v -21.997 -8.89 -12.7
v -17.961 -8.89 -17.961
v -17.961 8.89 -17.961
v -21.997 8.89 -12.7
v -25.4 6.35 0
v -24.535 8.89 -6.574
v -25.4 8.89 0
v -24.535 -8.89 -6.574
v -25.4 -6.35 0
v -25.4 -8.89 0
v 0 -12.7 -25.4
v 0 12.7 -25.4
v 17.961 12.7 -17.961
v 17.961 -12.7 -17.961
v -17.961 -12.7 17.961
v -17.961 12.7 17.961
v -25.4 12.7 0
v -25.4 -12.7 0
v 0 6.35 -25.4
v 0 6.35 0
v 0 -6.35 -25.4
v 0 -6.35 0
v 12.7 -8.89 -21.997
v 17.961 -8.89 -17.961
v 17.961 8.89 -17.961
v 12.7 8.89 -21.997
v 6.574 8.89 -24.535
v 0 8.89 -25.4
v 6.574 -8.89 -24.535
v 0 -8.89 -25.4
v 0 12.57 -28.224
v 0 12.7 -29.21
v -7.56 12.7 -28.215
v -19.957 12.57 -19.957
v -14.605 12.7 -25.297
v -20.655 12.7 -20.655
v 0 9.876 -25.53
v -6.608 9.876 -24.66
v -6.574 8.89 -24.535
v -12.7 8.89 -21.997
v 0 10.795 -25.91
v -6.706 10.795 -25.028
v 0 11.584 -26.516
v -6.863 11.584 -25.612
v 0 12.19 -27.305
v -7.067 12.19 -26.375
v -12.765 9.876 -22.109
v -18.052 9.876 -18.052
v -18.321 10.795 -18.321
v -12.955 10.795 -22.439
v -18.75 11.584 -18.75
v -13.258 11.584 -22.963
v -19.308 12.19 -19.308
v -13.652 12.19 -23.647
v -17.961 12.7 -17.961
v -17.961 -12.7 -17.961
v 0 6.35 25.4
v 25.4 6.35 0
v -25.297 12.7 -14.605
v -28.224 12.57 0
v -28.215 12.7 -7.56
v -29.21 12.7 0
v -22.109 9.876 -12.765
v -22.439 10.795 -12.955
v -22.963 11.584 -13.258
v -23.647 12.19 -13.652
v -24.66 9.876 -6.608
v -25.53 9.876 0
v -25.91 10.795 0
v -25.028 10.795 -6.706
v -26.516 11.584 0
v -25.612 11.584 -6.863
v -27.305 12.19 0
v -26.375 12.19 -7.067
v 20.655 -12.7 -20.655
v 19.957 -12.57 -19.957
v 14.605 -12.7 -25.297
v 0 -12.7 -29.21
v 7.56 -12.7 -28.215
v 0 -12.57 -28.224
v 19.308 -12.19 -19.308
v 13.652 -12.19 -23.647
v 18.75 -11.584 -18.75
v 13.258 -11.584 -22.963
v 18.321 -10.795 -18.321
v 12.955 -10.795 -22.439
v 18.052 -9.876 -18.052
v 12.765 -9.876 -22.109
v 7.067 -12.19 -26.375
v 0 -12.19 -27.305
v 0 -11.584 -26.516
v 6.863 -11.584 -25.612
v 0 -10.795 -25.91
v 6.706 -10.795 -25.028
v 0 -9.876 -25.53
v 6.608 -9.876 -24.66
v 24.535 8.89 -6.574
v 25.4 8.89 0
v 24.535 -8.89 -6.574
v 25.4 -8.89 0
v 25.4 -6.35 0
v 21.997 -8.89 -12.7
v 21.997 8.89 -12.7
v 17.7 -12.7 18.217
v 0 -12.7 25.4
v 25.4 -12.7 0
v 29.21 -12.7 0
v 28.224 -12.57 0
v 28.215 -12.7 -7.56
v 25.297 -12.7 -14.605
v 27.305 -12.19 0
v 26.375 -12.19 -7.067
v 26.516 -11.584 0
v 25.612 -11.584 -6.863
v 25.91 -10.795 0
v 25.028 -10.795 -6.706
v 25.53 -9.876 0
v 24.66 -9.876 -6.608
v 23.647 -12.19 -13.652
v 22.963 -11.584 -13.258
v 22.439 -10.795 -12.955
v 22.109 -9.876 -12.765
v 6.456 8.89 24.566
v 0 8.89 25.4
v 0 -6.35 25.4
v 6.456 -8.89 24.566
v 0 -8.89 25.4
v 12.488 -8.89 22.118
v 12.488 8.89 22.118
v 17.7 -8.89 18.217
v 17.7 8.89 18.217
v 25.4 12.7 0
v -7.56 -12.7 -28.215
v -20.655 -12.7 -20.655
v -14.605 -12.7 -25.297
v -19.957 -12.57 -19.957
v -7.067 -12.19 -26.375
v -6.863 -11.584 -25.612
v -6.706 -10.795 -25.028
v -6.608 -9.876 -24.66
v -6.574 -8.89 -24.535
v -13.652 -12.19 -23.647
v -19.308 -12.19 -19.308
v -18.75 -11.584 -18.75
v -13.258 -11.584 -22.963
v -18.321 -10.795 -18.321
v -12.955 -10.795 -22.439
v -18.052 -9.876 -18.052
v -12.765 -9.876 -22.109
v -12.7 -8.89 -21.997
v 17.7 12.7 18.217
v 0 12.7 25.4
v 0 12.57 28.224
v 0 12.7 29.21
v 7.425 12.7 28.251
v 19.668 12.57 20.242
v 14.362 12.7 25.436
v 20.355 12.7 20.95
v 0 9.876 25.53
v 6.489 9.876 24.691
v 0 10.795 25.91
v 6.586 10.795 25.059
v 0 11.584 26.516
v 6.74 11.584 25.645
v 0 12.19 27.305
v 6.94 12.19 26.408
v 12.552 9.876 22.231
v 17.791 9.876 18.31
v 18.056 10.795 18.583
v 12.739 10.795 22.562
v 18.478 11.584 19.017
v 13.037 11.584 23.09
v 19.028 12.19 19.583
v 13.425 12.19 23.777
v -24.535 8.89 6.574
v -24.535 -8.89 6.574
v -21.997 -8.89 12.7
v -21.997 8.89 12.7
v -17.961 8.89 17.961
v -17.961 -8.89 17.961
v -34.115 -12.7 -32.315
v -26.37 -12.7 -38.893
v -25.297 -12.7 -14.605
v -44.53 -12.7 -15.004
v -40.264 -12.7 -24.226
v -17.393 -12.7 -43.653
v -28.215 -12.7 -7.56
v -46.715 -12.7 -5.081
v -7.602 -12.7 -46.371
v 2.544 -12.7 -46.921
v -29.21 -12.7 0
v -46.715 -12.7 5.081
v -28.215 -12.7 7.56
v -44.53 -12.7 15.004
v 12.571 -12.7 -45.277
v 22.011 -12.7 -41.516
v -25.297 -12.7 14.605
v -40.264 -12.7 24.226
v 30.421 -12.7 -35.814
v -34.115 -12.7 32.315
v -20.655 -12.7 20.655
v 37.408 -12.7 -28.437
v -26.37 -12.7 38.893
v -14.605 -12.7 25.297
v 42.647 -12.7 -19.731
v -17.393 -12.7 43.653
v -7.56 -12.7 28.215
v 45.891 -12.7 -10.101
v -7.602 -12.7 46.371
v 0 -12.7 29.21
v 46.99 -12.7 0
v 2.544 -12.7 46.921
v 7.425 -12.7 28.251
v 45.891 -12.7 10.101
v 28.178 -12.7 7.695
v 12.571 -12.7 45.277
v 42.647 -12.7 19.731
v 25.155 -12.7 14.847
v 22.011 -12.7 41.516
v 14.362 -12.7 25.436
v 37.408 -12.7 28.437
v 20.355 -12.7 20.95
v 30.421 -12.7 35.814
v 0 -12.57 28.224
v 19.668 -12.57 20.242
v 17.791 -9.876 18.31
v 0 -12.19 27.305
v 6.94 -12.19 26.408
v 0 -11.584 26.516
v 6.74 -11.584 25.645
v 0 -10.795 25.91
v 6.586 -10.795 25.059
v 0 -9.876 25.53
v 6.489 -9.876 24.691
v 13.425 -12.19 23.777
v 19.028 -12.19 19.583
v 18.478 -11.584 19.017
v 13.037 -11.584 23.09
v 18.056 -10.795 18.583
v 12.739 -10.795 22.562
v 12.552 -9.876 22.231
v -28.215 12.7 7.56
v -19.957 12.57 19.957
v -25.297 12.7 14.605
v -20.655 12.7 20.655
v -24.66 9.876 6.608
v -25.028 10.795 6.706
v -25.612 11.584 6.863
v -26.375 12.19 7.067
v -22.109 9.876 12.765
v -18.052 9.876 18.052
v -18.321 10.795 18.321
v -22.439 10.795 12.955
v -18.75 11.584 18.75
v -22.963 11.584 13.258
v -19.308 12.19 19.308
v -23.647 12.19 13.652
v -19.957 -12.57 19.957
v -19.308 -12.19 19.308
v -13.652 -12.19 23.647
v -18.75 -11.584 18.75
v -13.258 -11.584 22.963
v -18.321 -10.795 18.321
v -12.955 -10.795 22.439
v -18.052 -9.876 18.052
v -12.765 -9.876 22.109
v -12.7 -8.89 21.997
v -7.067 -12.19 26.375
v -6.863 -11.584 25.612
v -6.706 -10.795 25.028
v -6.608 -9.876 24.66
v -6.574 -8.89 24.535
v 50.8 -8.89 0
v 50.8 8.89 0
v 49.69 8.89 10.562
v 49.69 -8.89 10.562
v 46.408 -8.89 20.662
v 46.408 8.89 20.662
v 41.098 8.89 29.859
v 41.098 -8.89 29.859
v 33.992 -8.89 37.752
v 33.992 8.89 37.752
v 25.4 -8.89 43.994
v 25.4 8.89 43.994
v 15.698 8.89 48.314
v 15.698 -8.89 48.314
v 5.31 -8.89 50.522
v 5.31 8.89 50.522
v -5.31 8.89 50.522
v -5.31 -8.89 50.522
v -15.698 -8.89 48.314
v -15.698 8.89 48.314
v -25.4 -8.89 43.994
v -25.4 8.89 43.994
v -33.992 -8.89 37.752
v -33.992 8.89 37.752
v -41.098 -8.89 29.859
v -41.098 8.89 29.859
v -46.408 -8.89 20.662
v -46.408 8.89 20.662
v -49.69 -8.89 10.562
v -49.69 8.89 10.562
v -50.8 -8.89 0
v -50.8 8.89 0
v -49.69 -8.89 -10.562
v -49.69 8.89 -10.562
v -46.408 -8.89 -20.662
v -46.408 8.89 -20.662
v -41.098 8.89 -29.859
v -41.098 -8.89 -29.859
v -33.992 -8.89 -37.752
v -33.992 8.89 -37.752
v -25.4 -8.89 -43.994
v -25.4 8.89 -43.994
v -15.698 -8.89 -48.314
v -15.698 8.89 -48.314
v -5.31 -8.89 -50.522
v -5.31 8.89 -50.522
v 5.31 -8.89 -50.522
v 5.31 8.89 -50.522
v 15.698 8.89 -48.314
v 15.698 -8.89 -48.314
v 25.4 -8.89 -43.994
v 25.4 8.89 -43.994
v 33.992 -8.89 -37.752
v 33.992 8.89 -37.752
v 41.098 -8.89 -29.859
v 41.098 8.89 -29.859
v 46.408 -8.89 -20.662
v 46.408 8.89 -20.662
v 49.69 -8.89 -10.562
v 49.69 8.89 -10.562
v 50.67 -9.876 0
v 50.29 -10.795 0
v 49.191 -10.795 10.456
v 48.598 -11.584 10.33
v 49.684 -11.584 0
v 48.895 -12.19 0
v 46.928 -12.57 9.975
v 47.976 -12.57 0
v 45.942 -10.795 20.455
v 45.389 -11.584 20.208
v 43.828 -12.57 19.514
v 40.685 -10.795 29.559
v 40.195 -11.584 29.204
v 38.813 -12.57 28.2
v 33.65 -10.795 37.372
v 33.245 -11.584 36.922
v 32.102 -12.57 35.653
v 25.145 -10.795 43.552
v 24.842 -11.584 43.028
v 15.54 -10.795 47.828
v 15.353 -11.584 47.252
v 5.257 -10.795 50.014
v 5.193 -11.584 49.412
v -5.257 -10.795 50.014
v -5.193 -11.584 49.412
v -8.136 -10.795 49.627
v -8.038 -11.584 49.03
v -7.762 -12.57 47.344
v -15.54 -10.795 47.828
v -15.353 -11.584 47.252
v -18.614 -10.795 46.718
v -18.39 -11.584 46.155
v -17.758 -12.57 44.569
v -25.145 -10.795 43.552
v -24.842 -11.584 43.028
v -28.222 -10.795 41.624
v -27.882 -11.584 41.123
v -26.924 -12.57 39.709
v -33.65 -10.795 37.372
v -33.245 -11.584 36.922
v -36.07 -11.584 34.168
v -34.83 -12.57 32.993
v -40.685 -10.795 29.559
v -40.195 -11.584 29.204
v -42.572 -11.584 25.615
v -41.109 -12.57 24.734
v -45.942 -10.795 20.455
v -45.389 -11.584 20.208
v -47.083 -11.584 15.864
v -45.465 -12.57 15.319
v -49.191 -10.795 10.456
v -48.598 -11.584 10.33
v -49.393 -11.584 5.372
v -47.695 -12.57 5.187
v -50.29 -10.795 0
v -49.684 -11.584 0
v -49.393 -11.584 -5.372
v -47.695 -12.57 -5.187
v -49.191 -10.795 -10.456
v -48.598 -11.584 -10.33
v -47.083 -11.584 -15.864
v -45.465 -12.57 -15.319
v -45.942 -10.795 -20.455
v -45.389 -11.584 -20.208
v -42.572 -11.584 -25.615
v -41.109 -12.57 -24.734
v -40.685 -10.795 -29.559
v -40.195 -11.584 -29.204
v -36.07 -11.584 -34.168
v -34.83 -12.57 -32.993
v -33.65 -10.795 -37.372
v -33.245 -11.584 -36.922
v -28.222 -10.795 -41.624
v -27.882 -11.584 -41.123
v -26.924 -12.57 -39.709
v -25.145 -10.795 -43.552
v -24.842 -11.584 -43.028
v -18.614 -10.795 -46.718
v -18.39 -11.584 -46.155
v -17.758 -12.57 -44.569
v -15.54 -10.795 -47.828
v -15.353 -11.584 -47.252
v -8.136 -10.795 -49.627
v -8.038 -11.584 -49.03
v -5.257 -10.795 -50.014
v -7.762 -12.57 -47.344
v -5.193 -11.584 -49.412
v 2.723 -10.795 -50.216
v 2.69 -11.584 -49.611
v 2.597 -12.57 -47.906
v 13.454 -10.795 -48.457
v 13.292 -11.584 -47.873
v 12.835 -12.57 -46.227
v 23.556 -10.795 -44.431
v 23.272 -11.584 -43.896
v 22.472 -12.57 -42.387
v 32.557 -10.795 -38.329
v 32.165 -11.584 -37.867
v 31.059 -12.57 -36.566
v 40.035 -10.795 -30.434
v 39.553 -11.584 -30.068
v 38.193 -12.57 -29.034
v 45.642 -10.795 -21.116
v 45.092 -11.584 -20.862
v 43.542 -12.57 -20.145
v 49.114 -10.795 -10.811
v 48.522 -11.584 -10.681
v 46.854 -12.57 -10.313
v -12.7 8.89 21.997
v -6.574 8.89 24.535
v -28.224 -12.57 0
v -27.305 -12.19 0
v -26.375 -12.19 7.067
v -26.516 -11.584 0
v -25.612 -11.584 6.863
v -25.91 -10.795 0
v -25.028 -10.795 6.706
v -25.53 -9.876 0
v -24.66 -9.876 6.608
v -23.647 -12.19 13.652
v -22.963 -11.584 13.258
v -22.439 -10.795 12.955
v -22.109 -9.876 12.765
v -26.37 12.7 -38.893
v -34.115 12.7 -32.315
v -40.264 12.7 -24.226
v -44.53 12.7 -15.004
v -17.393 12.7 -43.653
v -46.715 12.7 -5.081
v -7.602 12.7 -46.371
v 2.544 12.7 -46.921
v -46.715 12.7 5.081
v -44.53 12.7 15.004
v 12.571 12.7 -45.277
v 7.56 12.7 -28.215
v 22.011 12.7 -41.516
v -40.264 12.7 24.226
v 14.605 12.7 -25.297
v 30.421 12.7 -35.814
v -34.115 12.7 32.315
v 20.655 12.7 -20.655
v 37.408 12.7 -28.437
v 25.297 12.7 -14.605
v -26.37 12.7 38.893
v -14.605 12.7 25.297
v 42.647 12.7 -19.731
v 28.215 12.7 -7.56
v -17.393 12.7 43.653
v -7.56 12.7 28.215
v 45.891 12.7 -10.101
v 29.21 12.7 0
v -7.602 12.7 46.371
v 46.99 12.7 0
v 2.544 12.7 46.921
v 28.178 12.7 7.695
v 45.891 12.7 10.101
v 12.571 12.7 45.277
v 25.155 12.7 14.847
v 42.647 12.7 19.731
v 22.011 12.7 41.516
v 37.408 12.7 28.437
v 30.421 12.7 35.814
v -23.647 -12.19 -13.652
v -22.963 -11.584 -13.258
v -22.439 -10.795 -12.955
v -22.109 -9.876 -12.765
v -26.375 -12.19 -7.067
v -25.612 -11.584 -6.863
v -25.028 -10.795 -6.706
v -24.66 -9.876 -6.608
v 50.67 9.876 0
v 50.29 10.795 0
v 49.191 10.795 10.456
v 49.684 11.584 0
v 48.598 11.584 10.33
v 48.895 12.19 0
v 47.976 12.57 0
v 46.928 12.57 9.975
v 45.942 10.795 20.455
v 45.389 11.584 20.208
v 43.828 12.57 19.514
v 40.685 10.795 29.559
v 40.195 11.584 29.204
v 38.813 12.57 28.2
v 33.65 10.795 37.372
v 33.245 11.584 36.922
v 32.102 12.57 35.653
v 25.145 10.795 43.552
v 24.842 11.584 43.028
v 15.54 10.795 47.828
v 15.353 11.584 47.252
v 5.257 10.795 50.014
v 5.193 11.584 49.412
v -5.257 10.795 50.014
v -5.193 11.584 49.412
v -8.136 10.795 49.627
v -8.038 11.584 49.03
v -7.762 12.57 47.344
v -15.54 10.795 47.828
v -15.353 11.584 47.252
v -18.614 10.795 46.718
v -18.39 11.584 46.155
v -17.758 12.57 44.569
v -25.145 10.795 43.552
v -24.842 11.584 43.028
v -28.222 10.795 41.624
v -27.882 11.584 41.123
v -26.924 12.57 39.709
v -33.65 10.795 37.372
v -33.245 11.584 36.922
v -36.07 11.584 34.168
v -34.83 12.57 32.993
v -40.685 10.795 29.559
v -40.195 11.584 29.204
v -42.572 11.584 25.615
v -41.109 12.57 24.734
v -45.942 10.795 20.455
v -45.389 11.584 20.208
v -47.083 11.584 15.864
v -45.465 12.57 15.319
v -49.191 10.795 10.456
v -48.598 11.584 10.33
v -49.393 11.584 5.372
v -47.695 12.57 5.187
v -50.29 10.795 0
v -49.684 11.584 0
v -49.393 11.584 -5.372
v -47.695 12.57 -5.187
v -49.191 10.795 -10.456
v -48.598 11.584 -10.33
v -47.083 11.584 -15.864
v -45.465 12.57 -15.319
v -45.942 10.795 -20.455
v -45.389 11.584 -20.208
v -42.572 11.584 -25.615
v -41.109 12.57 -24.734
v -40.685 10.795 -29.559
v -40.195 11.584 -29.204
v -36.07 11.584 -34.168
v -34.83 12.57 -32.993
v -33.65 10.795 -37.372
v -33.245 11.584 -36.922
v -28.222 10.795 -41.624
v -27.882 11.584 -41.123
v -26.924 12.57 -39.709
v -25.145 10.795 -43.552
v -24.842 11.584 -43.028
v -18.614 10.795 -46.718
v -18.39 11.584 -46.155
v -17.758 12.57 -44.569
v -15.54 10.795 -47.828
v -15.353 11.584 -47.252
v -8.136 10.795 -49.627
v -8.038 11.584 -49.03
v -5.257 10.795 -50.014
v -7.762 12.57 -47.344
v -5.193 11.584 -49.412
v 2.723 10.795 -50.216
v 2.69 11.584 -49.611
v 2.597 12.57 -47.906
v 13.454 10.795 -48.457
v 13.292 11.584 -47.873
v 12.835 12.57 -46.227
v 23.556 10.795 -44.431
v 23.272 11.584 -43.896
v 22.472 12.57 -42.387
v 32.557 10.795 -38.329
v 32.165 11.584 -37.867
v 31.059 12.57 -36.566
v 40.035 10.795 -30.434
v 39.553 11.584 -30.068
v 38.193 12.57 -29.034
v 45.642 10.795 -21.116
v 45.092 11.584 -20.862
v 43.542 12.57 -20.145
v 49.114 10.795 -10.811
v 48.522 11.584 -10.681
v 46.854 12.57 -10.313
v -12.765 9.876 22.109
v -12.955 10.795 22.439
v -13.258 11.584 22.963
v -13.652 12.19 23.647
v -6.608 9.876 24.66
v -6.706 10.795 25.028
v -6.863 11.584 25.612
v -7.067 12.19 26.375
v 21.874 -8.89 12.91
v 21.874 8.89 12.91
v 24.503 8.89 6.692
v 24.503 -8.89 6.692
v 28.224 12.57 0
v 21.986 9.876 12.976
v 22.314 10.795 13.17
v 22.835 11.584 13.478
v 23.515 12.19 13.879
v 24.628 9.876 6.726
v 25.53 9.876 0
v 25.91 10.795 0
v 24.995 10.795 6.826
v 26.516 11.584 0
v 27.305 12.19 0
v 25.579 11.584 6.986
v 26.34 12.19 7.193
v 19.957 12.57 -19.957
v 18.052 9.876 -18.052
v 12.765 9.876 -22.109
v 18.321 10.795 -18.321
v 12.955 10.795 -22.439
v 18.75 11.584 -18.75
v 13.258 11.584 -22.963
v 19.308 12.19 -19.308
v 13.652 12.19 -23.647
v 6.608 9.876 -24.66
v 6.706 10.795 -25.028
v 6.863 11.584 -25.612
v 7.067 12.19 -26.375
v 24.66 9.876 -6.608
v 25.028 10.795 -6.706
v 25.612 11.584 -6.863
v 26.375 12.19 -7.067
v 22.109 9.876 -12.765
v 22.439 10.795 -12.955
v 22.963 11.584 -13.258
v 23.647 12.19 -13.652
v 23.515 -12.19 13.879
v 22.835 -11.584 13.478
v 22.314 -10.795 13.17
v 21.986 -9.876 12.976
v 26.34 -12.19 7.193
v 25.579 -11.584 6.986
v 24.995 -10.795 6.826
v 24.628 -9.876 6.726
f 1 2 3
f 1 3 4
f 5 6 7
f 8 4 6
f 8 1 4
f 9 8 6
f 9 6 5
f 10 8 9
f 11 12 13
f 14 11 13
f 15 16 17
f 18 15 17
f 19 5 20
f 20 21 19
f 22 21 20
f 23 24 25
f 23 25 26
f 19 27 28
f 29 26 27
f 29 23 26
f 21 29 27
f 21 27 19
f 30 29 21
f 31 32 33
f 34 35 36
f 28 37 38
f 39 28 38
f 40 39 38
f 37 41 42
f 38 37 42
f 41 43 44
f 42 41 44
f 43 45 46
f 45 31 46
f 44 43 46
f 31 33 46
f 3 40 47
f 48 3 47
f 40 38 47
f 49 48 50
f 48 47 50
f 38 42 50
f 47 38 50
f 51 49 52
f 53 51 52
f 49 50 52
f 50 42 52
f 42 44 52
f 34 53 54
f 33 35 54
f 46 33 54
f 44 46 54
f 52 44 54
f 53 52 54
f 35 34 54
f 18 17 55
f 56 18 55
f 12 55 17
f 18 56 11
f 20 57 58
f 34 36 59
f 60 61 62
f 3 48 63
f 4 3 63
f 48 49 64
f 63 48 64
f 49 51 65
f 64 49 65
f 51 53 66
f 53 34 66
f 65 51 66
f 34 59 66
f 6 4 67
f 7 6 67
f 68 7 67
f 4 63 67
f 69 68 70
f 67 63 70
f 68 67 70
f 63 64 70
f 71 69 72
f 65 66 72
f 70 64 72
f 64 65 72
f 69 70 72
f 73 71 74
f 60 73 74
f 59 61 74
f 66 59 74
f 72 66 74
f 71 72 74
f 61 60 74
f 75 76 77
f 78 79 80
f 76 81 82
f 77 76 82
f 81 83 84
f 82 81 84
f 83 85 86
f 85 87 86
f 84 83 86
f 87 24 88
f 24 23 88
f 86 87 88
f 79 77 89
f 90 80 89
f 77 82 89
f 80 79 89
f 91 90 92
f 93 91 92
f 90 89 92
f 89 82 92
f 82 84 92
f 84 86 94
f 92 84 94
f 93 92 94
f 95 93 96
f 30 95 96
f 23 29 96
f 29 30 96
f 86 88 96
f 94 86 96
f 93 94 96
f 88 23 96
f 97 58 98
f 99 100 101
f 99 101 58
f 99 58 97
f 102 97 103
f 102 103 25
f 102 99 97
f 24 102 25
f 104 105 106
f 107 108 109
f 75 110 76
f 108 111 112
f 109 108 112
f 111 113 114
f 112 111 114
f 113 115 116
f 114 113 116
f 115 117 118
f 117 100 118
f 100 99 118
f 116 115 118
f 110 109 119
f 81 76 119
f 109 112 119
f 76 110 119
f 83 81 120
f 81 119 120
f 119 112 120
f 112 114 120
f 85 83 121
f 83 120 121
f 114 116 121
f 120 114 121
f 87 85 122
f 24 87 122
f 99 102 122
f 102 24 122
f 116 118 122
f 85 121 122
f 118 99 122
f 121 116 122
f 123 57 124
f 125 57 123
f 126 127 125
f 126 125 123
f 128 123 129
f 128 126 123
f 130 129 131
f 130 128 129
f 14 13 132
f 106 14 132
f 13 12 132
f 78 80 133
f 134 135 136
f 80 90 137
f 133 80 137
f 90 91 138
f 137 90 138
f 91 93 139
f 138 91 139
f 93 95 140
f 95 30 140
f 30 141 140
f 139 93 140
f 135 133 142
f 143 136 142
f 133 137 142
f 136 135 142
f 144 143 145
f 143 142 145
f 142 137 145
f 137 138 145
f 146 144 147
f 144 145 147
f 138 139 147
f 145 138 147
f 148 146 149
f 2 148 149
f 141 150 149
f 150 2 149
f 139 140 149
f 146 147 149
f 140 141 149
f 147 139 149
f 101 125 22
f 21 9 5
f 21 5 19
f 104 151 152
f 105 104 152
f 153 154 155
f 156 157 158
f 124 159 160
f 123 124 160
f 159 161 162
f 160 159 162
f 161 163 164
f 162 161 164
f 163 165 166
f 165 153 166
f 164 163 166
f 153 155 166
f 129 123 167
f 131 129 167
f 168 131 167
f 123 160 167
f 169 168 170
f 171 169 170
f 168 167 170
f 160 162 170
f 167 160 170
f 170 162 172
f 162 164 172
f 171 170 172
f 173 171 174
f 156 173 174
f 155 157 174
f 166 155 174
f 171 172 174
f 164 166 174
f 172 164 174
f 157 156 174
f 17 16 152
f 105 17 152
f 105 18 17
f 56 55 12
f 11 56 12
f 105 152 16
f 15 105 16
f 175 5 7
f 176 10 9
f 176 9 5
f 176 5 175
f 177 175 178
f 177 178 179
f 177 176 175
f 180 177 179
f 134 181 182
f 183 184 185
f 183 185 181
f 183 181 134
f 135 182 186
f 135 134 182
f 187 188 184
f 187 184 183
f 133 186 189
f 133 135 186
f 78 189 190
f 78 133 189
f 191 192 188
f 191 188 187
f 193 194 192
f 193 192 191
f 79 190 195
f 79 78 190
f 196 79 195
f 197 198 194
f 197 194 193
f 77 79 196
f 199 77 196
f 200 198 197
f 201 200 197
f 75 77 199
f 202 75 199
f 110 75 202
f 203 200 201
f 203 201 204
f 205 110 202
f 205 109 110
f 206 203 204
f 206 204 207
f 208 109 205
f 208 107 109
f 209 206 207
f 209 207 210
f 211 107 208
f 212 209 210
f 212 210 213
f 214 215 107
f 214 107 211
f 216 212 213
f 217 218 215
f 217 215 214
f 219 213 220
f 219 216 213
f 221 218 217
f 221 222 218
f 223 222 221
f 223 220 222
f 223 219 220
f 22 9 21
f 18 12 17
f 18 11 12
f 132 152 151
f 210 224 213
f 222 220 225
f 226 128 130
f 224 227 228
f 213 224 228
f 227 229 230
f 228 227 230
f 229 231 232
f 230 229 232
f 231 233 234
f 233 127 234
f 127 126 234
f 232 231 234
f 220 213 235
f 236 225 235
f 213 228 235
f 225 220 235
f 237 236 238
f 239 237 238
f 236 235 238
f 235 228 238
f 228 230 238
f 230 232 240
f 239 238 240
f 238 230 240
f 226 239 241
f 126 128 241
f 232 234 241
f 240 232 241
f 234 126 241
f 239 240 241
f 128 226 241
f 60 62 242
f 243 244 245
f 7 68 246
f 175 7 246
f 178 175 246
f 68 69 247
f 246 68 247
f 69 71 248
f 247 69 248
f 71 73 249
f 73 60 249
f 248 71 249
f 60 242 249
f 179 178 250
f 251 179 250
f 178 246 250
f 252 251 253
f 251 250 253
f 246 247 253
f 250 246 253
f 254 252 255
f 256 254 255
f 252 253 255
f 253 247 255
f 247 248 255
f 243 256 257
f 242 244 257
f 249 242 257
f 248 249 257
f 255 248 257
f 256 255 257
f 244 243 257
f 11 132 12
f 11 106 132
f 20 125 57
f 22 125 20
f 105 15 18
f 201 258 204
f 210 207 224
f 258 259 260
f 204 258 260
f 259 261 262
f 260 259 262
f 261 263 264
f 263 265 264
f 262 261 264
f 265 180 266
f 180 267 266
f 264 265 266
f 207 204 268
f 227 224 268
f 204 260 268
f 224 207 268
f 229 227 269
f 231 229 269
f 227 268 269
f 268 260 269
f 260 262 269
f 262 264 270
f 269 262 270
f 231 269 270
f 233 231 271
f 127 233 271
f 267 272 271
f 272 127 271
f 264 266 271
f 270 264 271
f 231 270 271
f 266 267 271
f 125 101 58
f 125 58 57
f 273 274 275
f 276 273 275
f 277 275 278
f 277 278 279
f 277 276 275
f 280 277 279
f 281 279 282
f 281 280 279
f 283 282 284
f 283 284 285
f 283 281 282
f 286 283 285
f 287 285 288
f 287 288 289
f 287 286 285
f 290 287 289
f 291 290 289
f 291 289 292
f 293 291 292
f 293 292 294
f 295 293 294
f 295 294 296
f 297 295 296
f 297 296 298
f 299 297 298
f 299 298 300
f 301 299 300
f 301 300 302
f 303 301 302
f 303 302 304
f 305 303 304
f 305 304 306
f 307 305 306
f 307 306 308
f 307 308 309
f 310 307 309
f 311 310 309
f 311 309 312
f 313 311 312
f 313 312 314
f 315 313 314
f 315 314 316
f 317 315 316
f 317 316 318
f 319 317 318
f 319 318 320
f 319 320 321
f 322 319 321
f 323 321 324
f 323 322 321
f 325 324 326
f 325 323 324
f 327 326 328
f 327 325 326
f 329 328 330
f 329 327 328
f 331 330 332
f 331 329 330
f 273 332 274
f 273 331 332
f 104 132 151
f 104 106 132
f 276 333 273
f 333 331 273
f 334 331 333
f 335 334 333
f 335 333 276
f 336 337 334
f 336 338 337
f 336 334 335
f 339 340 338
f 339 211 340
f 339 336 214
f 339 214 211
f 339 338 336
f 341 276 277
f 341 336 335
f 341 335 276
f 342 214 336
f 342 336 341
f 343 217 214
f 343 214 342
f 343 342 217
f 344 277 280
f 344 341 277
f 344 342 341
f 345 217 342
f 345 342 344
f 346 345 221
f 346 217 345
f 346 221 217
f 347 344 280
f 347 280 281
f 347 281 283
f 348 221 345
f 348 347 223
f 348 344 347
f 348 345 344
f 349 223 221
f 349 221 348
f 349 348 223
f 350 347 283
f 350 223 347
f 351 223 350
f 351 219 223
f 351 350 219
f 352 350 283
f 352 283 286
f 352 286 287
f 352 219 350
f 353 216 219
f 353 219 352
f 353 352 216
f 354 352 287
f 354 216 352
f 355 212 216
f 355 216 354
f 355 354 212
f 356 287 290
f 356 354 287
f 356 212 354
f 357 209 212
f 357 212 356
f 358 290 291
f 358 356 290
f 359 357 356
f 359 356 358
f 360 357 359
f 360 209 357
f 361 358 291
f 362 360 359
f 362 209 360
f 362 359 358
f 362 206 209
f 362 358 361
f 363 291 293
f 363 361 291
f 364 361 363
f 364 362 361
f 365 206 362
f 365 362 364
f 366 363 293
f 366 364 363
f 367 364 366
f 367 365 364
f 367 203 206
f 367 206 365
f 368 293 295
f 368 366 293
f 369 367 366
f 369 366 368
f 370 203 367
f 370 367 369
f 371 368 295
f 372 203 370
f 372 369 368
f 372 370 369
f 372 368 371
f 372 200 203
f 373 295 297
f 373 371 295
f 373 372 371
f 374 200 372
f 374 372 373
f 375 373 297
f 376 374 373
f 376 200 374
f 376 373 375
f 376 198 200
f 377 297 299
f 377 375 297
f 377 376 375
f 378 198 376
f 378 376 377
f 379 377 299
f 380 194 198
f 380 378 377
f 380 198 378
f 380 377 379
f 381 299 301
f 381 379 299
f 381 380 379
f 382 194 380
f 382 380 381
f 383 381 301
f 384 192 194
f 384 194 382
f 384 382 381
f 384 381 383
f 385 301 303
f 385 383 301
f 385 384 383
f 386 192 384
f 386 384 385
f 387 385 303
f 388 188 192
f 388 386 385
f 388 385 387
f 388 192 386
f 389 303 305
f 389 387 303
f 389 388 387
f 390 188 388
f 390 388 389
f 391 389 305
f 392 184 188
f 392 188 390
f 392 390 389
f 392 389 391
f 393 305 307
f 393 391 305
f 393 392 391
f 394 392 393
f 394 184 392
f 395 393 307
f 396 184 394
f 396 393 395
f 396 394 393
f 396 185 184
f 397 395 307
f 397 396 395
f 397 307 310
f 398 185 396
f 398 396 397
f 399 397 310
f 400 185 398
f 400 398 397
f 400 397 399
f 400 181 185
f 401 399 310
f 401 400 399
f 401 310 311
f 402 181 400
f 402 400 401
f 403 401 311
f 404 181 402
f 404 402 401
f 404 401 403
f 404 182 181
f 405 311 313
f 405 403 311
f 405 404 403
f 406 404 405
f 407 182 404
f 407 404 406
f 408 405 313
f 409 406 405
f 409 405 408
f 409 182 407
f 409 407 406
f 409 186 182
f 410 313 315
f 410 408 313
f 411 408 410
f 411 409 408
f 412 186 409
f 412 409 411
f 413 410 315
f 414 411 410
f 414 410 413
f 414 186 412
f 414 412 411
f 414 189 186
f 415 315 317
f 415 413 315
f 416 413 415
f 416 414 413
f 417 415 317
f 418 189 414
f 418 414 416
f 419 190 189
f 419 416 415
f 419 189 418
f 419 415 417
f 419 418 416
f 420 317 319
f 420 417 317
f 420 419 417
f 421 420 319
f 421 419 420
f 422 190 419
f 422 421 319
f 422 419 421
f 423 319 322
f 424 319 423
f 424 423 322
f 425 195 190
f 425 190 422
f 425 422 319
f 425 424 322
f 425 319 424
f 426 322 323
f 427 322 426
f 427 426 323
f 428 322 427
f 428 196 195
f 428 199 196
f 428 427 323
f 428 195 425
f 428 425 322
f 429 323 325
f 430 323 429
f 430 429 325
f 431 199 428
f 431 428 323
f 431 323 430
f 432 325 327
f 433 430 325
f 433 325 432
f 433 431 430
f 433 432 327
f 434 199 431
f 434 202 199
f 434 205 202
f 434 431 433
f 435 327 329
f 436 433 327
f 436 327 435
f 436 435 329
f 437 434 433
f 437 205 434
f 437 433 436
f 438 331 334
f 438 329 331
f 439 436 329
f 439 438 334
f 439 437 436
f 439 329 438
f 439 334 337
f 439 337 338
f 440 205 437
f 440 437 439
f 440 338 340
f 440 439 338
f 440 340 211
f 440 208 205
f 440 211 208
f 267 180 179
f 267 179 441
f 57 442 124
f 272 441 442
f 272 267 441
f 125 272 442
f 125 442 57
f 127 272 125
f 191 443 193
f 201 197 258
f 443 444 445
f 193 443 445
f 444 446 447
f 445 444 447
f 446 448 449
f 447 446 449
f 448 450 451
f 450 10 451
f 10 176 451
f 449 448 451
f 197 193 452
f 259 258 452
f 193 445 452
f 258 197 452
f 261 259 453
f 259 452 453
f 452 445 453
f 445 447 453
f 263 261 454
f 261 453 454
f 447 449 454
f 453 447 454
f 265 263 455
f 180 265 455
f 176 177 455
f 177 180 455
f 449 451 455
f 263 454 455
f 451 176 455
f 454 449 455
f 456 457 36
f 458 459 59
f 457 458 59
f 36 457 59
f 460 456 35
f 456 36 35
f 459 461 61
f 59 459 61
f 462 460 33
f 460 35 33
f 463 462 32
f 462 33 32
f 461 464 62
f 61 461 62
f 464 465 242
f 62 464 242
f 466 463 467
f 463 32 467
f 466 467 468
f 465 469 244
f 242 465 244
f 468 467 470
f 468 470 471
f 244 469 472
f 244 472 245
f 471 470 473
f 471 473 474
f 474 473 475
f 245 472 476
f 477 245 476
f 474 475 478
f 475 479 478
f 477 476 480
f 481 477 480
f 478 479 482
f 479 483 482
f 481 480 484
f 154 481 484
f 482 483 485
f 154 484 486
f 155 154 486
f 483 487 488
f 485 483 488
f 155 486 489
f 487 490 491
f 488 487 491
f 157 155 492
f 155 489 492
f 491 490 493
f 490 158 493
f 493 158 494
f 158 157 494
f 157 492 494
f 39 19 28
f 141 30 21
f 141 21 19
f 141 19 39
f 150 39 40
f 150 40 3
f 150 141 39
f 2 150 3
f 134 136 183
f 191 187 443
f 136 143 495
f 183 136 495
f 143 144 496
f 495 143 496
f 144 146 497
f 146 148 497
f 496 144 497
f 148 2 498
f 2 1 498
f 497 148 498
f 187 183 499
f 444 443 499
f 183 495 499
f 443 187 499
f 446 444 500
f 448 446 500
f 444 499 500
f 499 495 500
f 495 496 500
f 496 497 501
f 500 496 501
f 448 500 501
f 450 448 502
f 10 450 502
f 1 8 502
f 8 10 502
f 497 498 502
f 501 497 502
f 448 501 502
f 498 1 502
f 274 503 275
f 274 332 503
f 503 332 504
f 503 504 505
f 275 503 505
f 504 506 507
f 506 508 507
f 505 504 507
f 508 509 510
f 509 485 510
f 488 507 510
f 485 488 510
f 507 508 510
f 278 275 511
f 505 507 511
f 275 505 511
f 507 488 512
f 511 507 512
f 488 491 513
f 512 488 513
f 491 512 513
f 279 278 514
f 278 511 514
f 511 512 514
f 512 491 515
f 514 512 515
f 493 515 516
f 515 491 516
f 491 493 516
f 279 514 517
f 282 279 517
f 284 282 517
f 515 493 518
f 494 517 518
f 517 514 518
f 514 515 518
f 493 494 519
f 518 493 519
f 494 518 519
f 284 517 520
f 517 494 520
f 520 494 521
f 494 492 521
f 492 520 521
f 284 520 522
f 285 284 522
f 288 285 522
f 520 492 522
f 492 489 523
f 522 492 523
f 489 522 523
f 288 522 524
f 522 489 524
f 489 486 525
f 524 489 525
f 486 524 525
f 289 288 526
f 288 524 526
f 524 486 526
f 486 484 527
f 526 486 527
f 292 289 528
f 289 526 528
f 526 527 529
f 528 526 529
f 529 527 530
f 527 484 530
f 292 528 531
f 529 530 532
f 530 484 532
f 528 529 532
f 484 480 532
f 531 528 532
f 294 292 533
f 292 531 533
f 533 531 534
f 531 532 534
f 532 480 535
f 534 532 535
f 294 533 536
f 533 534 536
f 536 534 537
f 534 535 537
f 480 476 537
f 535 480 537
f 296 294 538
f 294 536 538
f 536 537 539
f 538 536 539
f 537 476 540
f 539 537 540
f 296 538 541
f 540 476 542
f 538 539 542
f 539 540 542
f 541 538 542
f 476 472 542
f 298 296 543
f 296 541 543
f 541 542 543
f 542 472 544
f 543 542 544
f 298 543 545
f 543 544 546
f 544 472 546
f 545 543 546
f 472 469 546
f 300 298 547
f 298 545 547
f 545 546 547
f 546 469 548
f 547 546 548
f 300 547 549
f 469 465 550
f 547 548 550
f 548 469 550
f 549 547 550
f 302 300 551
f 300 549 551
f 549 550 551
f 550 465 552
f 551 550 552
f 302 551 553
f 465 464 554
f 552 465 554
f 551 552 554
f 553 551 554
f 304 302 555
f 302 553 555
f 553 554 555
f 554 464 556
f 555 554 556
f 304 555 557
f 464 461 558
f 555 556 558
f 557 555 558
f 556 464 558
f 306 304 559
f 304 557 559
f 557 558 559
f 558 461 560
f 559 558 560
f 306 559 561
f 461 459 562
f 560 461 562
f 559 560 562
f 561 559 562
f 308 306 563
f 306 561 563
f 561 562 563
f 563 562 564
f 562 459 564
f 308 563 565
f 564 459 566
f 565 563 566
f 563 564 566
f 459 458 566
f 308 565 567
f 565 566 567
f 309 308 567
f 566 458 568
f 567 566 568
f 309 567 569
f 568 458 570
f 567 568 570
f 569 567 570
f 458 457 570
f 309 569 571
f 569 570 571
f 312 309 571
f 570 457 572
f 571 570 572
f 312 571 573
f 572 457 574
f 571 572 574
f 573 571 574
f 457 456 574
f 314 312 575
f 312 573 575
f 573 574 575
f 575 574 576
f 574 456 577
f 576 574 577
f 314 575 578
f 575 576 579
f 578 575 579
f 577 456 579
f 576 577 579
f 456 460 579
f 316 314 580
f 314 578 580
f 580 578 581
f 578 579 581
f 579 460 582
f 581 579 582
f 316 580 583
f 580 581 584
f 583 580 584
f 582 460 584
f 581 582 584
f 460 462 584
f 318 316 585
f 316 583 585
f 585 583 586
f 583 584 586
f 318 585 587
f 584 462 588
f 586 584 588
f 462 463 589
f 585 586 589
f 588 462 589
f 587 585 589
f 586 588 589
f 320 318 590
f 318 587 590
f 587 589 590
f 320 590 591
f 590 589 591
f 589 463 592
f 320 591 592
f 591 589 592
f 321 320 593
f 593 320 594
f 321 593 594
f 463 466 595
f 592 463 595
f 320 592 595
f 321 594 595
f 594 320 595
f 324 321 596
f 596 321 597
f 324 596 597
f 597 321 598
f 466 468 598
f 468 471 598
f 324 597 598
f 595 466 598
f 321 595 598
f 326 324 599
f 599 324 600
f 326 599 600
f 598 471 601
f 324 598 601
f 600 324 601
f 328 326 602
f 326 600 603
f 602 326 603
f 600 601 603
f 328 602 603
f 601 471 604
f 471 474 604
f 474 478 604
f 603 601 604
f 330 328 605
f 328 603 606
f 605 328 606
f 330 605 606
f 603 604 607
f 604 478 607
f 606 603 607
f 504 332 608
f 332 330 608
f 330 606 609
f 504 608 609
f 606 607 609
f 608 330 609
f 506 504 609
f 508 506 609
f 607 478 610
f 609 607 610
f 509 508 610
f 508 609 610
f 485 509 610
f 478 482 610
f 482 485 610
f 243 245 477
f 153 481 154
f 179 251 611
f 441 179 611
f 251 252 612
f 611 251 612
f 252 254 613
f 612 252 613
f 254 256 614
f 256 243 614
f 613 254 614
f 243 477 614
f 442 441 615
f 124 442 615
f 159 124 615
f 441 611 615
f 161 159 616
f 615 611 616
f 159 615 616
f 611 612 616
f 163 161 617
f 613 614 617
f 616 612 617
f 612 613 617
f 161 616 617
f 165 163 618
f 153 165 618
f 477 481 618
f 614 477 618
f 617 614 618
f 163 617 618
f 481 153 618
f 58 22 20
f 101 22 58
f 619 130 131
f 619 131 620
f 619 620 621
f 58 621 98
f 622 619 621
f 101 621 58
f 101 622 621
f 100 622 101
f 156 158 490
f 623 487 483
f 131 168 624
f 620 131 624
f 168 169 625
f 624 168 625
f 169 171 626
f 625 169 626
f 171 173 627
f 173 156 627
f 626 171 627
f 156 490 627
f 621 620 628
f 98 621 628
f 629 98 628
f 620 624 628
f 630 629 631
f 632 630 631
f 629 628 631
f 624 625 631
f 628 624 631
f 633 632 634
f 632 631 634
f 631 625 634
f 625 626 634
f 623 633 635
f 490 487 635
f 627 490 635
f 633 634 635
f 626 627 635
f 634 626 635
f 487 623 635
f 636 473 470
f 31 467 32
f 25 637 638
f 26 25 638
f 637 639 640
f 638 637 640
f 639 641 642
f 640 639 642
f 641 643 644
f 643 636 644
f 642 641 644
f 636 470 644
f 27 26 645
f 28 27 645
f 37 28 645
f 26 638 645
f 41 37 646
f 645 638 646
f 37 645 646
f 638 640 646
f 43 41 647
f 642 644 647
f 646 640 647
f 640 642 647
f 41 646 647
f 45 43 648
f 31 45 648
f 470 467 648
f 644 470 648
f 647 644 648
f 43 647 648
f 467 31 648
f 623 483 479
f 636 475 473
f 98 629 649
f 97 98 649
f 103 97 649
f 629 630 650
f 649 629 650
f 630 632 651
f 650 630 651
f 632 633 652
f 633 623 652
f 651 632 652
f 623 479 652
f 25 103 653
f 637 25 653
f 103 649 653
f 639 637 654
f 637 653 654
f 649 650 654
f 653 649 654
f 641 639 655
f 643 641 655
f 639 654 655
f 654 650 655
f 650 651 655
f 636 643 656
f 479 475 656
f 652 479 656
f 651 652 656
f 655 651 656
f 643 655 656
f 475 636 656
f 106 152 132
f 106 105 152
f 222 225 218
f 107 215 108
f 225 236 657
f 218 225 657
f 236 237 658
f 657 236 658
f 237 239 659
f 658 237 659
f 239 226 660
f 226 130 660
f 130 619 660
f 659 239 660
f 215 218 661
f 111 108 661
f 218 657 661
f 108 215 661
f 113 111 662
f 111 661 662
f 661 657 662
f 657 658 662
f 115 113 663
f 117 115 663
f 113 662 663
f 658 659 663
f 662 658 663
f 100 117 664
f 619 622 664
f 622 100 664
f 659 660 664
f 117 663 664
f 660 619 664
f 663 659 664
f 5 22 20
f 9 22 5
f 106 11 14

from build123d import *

# Parameters (mm, degrees)
F0_R     = 50.8
F1_DEPTH = 12.7
F2_DEPTH = 6.35
F3_R     = 3.81
F4_DEPTH = 12.7


with BuildPart() as f1:
    # F0 (on Front) → F1 (new body, symmetric)
    with BuildSketch(Plane.XZ):
        Circle(F0_R)
        with BuildLine():
            ThreePointArc((17.700283, 18.217024), (23.396017, 9.888701), (25.4, 0))
            ThreePointArc((25.4, 0), (23.46654, -9.720159), (17.960512, -17.960512))
            ThreePointArc((17.960512, -17.960512), (9.720159, -23.46654), (0, -25.4))
            ThreePointArc((0, -25.4), (-9.720159, -23.46654), (-17.960512, -17.960512))
            ThreePointArc((-17.960512, -17.960512), (-23.46654, -9.720159), (-25.4, 0))
            ThreePointArc((-25.4, 0), (-23.46654, 9.720159), (-17.960512, 17.960512))
            ThreePointArc((-17.960512, 17.960512), (-9.720159, 23.46654), (0, 25.4))
            ThreePointArc((0, 25.4), (9.551115, 23.535849), (17.700283, 18.217024))
        make_face(mode=Mode.SUBTRACT)
    extrude(amount=F1_DEPTH, both=True)

    # F0 (on Front) → F2 (join, symmetric)
    with BuildSketch(Plane.XZ):
        Circle(F0_R)
        with BuildLine():
            ThreePointArc((17.700283, 18.217024), (23.396017, 9.888701), (25.4, 0))
            ThreePointArc((25.4, 0), (23.46654, -9.720159), (17.960512, -17.960512))
            ThreePointArc((17.960512, -17.960512), (9.720159, -23.46654), (0, -25.4))
            ThreePointArc((0, -25.4), (-9.720159, -23.46654), (-17.960512, -17.960512))
            ThreePointArc((-17.960512, -17.960512), (-23.46654, -9.720159), (-25.4, 0))
            ThreePointArc((-25.4, 0), (-23.46654, 9.720159), (-17.960512, 17.960512))
            ThreePointArc((-17.960512, 17.960512), (-9.720159, 23.46654), (0, 25.4))
            ThreePointArc((0, 25.4), (9.551115, 23.535849), (17.700283, 18.217024))
        make_face(mode=Mode.SUBTRACT)
        Polygon((0, 0), (25.4, 0), (12.7, 12.7), align=None)
        Polygon((0, 0), (12.7, 12.7), (0, 25.4), align=None)
        Polygon((-12.7, -12.7), (0, 0), (-25.4, 0), align=None)
        Polygon((0, -25.4), (0, 0), (-12.7, -12.7), align=None)
    extrude(amount=F2_DEPTH, both=True)

    # F3
    f3_edges = [f1.edges().sort_by_distance(p)[0] for p in [
        (-50.8, 12.7, 0),
        (-50.8, -12.7, 0),
        (-23.46654, -12.7, -9.720159),
        (-23.46654, 12.7, 9.720159),
    ]]
    fillet(f3_edges, radius=F3_R)


with BuildPart() as f4:
    # F0 (on Front) → F4 (new body, symmetric)
    with BuildSketch(Plane.XZ):
        Polygon((17.960512, -17.960512), (25.4, 0), (12.7, -12.7), align=None)
        Polygon((0, -25.4), (17.960512, -17.960512), (12.7, -12.7), align=None)
        Polygon((-17.960512, -17.960512), (0, -25.4), (-12.7, -12.7), (-25.4, 0), align=None)
        Polygon((-12.7, 12.7), (0, 25.4), (-17.960512, 17.960512), (-25.4, 0), align=None)
        Polygon((12.7, 12.7), (25.4, 0), (17.700283, 18.217024), (0, 25.4), align=None)
    extrude(amount=F4_DEPTH, both=True)


solid = Compound([f1.part, f4.part])
